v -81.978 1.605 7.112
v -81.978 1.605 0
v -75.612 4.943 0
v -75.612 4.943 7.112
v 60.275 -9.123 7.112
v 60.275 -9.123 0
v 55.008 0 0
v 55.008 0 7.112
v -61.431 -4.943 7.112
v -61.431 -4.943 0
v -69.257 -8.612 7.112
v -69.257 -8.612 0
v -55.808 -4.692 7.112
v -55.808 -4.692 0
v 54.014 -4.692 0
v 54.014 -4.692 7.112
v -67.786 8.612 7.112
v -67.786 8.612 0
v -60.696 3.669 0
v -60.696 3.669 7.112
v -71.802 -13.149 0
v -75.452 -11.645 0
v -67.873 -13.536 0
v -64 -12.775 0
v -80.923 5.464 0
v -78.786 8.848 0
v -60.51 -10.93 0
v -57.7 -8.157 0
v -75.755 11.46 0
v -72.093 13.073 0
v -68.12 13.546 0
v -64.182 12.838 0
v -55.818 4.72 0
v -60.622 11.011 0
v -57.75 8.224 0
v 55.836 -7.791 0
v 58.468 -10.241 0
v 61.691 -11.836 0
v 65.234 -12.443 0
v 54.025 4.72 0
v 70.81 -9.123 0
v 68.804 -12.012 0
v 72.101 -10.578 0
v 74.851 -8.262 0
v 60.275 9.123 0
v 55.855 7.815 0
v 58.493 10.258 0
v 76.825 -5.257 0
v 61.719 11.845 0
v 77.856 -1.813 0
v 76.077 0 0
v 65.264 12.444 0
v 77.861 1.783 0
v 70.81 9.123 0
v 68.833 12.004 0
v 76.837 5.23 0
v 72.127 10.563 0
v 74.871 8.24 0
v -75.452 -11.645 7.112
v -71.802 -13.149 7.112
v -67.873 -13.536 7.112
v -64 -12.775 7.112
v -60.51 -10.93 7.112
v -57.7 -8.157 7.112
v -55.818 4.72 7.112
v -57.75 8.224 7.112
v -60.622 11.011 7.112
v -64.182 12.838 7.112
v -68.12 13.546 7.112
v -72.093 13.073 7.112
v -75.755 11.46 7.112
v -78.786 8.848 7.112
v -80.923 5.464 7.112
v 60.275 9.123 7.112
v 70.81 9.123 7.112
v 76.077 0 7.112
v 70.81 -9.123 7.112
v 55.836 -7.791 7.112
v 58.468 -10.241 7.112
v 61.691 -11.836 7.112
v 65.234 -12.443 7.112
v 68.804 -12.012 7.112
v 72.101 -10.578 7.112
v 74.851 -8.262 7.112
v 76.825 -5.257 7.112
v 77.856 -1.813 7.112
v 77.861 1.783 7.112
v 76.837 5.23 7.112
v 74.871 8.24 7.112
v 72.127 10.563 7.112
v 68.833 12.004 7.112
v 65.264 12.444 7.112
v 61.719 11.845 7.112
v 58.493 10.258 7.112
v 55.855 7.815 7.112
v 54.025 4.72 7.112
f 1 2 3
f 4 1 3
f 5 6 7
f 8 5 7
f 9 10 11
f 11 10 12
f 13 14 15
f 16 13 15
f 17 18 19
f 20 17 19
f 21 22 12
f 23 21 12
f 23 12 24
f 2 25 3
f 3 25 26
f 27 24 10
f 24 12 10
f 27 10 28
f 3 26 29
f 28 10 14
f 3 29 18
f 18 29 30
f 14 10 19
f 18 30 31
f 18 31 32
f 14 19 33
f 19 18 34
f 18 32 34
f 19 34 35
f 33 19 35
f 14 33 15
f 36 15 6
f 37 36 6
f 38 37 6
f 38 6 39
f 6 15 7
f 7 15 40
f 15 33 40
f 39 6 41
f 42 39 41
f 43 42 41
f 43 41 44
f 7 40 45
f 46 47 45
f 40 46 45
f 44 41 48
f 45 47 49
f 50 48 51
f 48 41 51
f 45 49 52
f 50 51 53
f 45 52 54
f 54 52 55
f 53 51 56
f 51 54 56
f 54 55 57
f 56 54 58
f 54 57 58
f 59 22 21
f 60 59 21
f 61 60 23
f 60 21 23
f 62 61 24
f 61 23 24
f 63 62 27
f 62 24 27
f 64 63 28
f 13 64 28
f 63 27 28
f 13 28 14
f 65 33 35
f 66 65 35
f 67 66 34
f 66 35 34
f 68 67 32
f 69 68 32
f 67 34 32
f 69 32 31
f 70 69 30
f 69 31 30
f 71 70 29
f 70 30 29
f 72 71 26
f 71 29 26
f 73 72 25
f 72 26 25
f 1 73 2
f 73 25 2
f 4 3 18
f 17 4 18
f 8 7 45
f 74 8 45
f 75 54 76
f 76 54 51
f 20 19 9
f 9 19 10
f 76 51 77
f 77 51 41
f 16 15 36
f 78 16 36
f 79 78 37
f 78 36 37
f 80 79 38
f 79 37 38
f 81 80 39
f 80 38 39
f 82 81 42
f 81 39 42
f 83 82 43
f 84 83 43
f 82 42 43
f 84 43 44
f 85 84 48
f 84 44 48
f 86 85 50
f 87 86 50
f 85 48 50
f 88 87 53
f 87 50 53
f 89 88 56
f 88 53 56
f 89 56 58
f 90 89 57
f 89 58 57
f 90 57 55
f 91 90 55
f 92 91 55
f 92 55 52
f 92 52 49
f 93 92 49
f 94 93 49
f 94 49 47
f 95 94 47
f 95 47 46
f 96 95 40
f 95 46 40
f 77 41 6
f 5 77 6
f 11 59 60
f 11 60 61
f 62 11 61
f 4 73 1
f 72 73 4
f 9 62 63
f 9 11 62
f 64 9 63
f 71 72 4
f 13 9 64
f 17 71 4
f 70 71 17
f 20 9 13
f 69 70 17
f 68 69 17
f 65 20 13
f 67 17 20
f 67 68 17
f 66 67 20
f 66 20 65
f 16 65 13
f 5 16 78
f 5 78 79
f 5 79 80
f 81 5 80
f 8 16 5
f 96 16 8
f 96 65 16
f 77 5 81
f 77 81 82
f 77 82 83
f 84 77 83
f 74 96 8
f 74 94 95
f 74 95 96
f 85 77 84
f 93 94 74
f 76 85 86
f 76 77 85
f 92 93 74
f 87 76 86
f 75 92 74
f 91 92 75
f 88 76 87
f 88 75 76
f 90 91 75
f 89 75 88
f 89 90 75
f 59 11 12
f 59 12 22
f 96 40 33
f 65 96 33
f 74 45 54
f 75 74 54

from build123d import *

# Parameters (mm, degrees)
F1_DEPTH = 7.112


with BuildPart() as f1:
    # F0 (on Top) → F1 (new body)
    with BuildSketch(Plane.XY):
        with BuildLine():
            Line((-55.80807, -4.691954), (54.014004, -4.691954))
            ThreePointArc((54.014004, -4.691954), (77.989111, -0.015025), (54.025366, 4.719774))
            Line((54.025366, 4.719774), (-55.818372, 4.719774))
            ThreePointArc((-55.818372, 4.719774), (-70.124067, 13.45667), (-81.978054, 1.604697))
            Line((-81.978054, 1.604697), (-75.612001, 4.942868))
            Line((-75.612001, 4.942868), (-67.786179, 8.611853))
            Line((-67.786179, 8.611853), (-60.695834, 3.668985))
            Line((-60.695834, 3.668985), (-61.431311, -4.942868))
            Line((-61.431311, -4.942868), (-69.257133, -8.611853))
            Line((-69.257133, -8.611853), (-75.452484, -11.645313))
            ThreePointArc((-75.452484, -11.645313), (-63.999779, -12.775067), (-55.80807, -4.691954))
        make_face()
        Polygon((55.007732, 0), (60.275092, 9.123336), (70.809812, 9.123336), (76.077173, 0), (70.809812, -9.123336), (60.275092, -9.123336), align=None, mode=Mode.SUBTRACT)
    extrude(amount=F1_DEPTH)


solid = f1.part
